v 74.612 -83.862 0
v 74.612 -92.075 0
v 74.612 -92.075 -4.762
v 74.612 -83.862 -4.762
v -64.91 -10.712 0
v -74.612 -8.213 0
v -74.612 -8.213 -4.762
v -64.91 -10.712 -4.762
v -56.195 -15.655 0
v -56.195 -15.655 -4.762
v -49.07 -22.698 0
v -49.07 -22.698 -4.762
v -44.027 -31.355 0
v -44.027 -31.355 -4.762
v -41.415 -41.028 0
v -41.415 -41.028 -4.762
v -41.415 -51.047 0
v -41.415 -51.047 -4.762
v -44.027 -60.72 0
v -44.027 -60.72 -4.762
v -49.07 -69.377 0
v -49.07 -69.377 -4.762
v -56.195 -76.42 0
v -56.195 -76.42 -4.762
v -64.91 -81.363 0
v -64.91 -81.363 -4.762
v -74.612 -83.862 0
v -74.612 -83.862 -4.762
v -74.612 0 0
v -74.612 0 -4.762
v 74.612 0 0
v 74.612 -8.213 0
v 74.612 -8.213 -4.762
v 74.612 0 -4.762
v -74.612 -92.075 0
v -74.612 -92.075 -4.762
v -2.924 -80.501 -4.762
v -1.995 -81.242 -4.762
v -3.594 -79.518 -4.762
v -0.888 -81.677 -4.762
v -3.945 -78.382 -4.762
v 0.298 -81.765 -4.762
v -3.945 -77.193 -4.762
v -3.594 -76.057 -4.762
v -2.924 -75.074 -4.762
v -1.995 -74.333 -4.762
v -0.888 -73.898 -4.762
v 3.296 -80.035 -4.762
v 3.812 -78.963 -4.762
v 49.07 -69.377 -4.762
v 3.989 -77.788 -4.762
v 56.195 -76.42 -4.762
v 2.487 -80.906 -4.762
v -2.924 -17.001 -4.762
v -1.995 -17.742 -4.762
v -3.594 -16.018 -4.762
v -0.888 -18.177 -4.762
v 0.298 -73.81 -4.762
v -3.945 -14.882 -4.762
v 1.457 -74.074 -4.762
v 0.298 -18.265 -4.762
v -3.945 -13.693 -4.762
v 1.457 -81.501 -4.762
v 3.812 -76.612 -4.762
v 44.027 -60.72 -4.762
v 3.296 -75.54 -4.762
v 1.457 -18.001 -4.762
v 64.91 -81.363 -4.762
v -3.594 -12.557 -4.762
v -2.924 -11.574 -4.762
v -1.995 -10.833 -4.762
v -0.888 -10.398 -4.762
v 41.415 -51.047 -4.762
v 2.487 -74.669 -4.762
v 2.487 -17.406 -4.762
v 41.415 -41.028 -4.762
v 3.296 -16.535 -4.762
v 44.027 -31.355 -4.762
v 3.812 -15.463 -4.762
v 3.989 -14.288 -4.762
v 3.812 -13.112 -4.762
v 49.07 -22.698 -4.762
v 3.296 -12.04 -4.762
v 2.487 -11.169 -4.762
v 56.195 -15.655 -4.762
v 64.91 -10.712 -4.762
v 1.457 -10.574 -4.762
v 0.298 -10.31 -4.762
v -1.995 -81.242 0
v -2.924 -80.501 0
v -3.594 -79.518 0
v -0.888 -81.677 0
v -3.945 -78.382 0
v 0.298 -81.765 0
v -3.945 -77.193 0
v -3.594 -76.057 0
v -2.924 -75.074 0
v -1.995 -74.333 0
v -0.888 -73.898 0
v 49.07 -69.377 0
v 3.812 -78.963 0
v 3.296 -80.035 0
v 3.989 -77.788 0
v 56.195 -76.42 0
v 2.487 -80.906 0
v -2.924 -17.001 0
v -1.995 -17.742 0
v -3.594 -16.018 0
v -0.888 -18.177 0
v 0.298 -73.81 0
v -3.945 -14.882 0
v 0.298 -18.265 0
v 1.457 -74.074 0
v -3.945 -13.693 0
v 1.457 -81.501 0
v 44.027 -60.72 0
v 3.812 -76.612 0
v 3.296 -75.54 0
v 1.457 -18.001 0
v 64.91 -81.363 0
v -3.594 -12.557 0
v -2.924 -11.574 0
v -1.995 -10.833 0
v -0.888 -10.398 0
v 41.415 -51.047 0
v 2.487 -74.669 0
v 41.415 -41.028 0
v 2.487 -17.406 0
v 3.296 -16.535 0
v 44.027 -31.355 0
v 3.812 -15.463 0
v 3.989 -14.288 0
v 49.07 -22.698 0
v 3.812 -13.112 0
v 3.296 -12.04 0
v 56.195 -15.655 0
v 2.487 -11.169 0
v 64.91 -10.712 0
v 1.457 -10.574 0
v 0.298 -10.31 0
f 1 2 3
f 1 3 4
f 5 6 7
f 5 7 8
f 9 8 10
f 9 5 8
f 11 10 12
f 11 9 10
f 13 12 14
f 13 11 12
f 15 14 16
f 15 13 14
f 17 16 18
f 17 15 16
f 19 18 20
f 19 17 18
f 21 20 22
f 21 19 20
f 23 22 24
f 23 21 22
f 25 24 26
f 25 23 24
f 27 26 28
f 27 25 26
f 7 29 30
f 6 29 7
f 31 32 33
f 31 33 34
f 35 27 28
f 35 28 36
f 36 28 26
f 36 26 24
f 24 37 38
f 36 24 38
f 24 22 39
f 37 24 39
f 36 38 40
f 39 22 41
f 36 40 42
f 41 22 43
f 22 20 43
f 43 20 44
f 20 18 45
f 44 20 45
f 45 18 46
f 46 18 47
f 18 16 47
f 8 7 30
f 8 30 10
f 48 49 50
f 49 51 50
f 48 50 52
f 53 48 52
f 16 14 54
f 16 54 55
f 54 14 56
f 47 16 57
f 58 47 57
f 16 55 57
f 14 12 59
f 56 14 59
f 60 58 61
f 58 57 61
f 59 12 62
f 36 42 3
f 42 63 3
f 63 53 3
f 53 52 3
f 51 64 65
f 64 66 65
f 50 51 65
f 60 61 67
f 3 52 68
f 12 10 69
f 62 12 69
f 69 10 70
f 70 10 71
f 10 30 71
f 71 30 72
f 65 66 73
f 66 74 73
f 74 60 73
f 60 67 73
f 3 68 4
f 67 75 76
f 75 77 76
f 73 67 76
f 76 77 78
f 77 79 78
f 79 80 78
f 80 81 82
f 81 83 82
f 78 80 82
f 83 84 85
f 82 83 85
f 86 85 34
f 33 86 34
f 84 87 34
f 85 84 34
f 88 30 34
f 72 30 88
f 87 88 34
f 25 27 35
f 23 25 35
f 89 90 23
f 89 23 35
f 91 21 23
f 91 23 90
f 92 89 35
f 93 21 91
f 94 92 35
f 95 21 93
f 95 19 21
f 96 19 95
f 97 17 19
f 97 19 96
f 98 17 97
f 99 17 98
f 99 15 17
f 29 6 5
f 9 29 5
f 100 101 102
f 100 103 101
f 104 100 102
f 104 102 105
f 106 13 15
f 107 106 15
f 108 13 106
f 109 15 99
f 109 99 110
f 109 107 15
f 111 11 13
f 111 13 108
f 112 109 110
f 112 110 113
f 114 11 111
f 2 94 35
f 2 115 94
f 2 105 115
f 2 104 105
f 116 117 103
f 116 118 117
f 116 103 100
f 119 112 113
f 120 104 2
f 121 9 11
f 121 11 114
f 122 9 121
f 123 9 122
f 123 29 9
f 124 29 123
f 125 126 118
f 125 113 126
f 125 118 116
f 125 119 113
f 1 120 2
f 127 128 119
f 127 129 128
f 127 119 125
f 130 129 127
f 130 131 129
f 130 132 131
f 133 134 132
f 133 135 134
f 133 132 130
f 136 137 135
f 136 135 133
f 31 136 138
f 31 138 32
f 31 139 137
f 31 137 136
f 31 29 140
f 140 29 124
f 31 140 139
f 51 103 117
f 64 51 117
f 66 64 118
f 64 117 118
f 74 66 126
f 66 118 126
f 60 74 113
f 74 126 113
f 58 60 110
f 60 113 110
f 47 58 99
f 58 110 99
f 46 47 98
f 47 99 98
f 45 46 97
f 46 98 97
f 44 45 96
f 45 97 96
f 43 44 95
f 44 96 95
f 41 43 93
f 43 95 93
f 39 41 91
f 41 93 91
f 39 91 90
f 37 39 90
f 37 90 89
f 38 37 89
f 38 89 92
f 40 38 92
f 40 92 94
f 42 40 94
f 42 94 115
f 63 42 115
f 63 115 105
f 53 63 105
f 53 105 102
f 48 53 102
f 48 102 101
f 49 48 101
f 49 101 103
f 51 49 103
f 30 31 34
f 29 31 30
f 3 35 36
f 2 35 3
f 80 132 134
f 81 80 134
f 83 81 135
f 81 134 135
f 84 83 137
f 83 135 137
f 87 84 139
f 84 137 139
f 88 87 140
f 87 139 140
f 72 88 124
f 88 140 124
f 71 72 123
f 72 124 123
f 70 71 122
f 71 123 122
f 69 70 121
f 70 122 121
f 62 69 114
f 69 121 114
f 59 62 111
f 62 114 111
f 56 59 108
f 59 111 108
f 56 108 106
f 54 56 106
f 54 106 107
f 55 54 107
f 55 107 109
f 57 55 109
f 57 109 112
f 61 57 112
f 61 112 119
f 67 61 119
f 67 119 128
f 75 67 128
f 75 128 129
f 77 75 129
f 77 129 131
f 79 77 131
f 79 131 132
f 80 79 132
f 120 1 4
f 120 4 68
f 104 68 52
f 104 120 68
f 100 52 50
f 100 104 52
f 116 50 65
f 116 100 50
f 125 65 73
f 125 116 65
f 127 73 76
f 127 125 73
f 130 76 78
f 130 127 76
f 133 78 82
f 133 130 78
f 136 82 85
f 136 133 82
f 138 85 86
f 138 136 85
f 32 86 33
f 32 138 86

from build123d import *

# Parameters (mm, degrees)
F0_W     = 38.1
F0_H     = 92.075
F1_DEPTH = 4.7625
F3_DEPTH = 4.7625
F4_R     = 3.98907
F5_DEPTH = 4.7635


with BuildPart() as f1:
    # F0 (on Top) → F1 (new body)
    with BuildSketch(Plane.XY):
        with Locations((0, -46.0375)):
            Rectangle(F0_W, F0_H)
    extrude(amount=-F1_DEPTH)

    # F2 (on Top) → F3 (join)
    with BuildSketch(Plane.XY):
        with BuildLine():
            Line((-19.05, 0), (-74.6125, 0))
            Line((-74.6125, 0), (-74.6125, -8.212815))
            ThreePointArc((-74.6125, -8.212815), (-41.0845, -46.0375), (-74.6125, -83.862185))
            Line((-74.6125, -83.862185), (-74.6125, -92.075))
            Line((-74.6125, -92.075), (-19.05, -92.075))
            Line((-19.05, -92.075), (-19.05, 0))
        make_face()
        with BuildLine():
            Line((74.6125, -8.212815), (74.6125, 0))
            Line((74.6125, 0), (19.05, 0))
            Line((19.05, 0), (19.05, -92.075))
            Line((19.05, -92.075), (74.6125, -92.075))
            Line((74.6125, -92.075), (74.6125, -83.862185))
            ThreePointArc((74.6125, -83.862185), (41.0845, -46.0375), (74.6125, -8.212815))
        make_face()
    extrude(amount=-F3_DEPTH)

    # F4 (on Top) → F5 (cut, through all)
    with BuildSketch(Plane.XY):
        with Locations((0, -14.2875)):
            Circle(F4_R)
        with Locations((0, -77.7875)):
            Circle(F4_R)
    extrude(amount=-F5_DEPTH, mode=Mode.SUBTRACT)


solid = f1.part
